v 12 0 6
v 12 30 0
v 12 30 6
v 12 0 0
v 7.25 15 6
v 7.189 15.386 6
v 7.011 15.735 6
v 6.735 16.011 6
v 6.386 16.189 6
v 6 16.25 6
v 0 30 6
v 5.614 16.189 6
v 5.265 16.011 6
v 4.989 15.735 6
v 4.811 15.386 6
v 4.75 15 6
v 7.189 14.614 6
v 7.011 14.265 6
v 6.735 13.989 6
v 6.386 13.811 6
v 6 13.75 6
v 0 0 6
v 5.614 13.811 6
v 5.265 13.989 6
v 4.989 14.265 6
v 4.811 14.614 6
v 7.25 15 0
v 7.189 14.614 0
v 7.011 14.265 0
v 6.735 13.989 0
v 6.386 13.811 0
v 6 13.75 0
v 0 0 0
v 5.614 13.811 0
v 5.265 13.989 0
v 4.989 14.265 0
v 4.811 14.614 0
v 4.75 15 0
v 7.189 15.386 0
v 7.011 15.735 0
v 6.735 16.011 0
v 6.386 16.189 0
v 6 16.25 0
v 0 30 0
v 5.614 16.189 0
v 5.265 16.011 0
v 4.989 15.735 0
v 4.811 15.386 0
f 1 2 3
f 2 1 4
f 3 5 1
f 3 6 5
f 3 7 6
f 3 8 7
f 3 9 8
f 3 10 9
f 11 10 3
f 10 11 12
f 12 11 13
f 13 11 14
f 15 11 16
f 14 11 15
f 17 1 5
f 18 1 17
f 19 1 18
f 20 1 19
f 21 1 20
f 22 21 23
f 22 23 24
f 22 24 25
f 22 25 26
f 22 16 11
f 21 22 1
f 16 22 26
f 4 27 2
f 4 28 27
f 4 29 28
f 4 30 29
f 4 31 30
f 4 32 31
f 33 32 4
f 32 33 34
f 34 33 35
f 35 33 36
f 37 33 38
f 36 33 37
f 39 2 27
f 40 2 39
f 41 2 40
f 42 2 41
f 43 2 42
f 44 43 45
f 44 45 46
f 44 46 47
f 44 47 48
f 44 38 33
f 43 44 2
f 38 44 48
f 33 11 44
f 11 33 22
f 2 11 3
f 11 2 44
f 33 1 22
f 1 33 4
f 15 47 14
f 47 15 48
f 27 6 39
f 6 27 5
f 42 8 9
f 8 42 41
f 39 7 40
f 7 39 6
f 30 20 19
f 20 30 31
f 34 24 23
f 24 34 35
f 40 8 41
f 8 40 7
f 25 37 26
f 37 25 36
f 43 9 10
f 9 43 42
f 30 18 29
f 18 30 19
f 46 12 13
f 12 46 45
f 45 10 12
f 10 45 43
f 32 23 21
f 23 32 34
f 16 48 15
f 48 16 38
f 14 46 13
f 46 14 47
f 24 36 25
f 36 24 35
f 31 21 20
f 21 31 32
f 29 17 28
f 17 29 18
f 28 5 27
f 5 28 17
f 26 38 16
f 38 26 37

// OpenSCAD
difference() {
cube([12,30,6]);
translate([6,15,0]) cylinder(6,2.5/2,2.5/2, $fn=20);
}
